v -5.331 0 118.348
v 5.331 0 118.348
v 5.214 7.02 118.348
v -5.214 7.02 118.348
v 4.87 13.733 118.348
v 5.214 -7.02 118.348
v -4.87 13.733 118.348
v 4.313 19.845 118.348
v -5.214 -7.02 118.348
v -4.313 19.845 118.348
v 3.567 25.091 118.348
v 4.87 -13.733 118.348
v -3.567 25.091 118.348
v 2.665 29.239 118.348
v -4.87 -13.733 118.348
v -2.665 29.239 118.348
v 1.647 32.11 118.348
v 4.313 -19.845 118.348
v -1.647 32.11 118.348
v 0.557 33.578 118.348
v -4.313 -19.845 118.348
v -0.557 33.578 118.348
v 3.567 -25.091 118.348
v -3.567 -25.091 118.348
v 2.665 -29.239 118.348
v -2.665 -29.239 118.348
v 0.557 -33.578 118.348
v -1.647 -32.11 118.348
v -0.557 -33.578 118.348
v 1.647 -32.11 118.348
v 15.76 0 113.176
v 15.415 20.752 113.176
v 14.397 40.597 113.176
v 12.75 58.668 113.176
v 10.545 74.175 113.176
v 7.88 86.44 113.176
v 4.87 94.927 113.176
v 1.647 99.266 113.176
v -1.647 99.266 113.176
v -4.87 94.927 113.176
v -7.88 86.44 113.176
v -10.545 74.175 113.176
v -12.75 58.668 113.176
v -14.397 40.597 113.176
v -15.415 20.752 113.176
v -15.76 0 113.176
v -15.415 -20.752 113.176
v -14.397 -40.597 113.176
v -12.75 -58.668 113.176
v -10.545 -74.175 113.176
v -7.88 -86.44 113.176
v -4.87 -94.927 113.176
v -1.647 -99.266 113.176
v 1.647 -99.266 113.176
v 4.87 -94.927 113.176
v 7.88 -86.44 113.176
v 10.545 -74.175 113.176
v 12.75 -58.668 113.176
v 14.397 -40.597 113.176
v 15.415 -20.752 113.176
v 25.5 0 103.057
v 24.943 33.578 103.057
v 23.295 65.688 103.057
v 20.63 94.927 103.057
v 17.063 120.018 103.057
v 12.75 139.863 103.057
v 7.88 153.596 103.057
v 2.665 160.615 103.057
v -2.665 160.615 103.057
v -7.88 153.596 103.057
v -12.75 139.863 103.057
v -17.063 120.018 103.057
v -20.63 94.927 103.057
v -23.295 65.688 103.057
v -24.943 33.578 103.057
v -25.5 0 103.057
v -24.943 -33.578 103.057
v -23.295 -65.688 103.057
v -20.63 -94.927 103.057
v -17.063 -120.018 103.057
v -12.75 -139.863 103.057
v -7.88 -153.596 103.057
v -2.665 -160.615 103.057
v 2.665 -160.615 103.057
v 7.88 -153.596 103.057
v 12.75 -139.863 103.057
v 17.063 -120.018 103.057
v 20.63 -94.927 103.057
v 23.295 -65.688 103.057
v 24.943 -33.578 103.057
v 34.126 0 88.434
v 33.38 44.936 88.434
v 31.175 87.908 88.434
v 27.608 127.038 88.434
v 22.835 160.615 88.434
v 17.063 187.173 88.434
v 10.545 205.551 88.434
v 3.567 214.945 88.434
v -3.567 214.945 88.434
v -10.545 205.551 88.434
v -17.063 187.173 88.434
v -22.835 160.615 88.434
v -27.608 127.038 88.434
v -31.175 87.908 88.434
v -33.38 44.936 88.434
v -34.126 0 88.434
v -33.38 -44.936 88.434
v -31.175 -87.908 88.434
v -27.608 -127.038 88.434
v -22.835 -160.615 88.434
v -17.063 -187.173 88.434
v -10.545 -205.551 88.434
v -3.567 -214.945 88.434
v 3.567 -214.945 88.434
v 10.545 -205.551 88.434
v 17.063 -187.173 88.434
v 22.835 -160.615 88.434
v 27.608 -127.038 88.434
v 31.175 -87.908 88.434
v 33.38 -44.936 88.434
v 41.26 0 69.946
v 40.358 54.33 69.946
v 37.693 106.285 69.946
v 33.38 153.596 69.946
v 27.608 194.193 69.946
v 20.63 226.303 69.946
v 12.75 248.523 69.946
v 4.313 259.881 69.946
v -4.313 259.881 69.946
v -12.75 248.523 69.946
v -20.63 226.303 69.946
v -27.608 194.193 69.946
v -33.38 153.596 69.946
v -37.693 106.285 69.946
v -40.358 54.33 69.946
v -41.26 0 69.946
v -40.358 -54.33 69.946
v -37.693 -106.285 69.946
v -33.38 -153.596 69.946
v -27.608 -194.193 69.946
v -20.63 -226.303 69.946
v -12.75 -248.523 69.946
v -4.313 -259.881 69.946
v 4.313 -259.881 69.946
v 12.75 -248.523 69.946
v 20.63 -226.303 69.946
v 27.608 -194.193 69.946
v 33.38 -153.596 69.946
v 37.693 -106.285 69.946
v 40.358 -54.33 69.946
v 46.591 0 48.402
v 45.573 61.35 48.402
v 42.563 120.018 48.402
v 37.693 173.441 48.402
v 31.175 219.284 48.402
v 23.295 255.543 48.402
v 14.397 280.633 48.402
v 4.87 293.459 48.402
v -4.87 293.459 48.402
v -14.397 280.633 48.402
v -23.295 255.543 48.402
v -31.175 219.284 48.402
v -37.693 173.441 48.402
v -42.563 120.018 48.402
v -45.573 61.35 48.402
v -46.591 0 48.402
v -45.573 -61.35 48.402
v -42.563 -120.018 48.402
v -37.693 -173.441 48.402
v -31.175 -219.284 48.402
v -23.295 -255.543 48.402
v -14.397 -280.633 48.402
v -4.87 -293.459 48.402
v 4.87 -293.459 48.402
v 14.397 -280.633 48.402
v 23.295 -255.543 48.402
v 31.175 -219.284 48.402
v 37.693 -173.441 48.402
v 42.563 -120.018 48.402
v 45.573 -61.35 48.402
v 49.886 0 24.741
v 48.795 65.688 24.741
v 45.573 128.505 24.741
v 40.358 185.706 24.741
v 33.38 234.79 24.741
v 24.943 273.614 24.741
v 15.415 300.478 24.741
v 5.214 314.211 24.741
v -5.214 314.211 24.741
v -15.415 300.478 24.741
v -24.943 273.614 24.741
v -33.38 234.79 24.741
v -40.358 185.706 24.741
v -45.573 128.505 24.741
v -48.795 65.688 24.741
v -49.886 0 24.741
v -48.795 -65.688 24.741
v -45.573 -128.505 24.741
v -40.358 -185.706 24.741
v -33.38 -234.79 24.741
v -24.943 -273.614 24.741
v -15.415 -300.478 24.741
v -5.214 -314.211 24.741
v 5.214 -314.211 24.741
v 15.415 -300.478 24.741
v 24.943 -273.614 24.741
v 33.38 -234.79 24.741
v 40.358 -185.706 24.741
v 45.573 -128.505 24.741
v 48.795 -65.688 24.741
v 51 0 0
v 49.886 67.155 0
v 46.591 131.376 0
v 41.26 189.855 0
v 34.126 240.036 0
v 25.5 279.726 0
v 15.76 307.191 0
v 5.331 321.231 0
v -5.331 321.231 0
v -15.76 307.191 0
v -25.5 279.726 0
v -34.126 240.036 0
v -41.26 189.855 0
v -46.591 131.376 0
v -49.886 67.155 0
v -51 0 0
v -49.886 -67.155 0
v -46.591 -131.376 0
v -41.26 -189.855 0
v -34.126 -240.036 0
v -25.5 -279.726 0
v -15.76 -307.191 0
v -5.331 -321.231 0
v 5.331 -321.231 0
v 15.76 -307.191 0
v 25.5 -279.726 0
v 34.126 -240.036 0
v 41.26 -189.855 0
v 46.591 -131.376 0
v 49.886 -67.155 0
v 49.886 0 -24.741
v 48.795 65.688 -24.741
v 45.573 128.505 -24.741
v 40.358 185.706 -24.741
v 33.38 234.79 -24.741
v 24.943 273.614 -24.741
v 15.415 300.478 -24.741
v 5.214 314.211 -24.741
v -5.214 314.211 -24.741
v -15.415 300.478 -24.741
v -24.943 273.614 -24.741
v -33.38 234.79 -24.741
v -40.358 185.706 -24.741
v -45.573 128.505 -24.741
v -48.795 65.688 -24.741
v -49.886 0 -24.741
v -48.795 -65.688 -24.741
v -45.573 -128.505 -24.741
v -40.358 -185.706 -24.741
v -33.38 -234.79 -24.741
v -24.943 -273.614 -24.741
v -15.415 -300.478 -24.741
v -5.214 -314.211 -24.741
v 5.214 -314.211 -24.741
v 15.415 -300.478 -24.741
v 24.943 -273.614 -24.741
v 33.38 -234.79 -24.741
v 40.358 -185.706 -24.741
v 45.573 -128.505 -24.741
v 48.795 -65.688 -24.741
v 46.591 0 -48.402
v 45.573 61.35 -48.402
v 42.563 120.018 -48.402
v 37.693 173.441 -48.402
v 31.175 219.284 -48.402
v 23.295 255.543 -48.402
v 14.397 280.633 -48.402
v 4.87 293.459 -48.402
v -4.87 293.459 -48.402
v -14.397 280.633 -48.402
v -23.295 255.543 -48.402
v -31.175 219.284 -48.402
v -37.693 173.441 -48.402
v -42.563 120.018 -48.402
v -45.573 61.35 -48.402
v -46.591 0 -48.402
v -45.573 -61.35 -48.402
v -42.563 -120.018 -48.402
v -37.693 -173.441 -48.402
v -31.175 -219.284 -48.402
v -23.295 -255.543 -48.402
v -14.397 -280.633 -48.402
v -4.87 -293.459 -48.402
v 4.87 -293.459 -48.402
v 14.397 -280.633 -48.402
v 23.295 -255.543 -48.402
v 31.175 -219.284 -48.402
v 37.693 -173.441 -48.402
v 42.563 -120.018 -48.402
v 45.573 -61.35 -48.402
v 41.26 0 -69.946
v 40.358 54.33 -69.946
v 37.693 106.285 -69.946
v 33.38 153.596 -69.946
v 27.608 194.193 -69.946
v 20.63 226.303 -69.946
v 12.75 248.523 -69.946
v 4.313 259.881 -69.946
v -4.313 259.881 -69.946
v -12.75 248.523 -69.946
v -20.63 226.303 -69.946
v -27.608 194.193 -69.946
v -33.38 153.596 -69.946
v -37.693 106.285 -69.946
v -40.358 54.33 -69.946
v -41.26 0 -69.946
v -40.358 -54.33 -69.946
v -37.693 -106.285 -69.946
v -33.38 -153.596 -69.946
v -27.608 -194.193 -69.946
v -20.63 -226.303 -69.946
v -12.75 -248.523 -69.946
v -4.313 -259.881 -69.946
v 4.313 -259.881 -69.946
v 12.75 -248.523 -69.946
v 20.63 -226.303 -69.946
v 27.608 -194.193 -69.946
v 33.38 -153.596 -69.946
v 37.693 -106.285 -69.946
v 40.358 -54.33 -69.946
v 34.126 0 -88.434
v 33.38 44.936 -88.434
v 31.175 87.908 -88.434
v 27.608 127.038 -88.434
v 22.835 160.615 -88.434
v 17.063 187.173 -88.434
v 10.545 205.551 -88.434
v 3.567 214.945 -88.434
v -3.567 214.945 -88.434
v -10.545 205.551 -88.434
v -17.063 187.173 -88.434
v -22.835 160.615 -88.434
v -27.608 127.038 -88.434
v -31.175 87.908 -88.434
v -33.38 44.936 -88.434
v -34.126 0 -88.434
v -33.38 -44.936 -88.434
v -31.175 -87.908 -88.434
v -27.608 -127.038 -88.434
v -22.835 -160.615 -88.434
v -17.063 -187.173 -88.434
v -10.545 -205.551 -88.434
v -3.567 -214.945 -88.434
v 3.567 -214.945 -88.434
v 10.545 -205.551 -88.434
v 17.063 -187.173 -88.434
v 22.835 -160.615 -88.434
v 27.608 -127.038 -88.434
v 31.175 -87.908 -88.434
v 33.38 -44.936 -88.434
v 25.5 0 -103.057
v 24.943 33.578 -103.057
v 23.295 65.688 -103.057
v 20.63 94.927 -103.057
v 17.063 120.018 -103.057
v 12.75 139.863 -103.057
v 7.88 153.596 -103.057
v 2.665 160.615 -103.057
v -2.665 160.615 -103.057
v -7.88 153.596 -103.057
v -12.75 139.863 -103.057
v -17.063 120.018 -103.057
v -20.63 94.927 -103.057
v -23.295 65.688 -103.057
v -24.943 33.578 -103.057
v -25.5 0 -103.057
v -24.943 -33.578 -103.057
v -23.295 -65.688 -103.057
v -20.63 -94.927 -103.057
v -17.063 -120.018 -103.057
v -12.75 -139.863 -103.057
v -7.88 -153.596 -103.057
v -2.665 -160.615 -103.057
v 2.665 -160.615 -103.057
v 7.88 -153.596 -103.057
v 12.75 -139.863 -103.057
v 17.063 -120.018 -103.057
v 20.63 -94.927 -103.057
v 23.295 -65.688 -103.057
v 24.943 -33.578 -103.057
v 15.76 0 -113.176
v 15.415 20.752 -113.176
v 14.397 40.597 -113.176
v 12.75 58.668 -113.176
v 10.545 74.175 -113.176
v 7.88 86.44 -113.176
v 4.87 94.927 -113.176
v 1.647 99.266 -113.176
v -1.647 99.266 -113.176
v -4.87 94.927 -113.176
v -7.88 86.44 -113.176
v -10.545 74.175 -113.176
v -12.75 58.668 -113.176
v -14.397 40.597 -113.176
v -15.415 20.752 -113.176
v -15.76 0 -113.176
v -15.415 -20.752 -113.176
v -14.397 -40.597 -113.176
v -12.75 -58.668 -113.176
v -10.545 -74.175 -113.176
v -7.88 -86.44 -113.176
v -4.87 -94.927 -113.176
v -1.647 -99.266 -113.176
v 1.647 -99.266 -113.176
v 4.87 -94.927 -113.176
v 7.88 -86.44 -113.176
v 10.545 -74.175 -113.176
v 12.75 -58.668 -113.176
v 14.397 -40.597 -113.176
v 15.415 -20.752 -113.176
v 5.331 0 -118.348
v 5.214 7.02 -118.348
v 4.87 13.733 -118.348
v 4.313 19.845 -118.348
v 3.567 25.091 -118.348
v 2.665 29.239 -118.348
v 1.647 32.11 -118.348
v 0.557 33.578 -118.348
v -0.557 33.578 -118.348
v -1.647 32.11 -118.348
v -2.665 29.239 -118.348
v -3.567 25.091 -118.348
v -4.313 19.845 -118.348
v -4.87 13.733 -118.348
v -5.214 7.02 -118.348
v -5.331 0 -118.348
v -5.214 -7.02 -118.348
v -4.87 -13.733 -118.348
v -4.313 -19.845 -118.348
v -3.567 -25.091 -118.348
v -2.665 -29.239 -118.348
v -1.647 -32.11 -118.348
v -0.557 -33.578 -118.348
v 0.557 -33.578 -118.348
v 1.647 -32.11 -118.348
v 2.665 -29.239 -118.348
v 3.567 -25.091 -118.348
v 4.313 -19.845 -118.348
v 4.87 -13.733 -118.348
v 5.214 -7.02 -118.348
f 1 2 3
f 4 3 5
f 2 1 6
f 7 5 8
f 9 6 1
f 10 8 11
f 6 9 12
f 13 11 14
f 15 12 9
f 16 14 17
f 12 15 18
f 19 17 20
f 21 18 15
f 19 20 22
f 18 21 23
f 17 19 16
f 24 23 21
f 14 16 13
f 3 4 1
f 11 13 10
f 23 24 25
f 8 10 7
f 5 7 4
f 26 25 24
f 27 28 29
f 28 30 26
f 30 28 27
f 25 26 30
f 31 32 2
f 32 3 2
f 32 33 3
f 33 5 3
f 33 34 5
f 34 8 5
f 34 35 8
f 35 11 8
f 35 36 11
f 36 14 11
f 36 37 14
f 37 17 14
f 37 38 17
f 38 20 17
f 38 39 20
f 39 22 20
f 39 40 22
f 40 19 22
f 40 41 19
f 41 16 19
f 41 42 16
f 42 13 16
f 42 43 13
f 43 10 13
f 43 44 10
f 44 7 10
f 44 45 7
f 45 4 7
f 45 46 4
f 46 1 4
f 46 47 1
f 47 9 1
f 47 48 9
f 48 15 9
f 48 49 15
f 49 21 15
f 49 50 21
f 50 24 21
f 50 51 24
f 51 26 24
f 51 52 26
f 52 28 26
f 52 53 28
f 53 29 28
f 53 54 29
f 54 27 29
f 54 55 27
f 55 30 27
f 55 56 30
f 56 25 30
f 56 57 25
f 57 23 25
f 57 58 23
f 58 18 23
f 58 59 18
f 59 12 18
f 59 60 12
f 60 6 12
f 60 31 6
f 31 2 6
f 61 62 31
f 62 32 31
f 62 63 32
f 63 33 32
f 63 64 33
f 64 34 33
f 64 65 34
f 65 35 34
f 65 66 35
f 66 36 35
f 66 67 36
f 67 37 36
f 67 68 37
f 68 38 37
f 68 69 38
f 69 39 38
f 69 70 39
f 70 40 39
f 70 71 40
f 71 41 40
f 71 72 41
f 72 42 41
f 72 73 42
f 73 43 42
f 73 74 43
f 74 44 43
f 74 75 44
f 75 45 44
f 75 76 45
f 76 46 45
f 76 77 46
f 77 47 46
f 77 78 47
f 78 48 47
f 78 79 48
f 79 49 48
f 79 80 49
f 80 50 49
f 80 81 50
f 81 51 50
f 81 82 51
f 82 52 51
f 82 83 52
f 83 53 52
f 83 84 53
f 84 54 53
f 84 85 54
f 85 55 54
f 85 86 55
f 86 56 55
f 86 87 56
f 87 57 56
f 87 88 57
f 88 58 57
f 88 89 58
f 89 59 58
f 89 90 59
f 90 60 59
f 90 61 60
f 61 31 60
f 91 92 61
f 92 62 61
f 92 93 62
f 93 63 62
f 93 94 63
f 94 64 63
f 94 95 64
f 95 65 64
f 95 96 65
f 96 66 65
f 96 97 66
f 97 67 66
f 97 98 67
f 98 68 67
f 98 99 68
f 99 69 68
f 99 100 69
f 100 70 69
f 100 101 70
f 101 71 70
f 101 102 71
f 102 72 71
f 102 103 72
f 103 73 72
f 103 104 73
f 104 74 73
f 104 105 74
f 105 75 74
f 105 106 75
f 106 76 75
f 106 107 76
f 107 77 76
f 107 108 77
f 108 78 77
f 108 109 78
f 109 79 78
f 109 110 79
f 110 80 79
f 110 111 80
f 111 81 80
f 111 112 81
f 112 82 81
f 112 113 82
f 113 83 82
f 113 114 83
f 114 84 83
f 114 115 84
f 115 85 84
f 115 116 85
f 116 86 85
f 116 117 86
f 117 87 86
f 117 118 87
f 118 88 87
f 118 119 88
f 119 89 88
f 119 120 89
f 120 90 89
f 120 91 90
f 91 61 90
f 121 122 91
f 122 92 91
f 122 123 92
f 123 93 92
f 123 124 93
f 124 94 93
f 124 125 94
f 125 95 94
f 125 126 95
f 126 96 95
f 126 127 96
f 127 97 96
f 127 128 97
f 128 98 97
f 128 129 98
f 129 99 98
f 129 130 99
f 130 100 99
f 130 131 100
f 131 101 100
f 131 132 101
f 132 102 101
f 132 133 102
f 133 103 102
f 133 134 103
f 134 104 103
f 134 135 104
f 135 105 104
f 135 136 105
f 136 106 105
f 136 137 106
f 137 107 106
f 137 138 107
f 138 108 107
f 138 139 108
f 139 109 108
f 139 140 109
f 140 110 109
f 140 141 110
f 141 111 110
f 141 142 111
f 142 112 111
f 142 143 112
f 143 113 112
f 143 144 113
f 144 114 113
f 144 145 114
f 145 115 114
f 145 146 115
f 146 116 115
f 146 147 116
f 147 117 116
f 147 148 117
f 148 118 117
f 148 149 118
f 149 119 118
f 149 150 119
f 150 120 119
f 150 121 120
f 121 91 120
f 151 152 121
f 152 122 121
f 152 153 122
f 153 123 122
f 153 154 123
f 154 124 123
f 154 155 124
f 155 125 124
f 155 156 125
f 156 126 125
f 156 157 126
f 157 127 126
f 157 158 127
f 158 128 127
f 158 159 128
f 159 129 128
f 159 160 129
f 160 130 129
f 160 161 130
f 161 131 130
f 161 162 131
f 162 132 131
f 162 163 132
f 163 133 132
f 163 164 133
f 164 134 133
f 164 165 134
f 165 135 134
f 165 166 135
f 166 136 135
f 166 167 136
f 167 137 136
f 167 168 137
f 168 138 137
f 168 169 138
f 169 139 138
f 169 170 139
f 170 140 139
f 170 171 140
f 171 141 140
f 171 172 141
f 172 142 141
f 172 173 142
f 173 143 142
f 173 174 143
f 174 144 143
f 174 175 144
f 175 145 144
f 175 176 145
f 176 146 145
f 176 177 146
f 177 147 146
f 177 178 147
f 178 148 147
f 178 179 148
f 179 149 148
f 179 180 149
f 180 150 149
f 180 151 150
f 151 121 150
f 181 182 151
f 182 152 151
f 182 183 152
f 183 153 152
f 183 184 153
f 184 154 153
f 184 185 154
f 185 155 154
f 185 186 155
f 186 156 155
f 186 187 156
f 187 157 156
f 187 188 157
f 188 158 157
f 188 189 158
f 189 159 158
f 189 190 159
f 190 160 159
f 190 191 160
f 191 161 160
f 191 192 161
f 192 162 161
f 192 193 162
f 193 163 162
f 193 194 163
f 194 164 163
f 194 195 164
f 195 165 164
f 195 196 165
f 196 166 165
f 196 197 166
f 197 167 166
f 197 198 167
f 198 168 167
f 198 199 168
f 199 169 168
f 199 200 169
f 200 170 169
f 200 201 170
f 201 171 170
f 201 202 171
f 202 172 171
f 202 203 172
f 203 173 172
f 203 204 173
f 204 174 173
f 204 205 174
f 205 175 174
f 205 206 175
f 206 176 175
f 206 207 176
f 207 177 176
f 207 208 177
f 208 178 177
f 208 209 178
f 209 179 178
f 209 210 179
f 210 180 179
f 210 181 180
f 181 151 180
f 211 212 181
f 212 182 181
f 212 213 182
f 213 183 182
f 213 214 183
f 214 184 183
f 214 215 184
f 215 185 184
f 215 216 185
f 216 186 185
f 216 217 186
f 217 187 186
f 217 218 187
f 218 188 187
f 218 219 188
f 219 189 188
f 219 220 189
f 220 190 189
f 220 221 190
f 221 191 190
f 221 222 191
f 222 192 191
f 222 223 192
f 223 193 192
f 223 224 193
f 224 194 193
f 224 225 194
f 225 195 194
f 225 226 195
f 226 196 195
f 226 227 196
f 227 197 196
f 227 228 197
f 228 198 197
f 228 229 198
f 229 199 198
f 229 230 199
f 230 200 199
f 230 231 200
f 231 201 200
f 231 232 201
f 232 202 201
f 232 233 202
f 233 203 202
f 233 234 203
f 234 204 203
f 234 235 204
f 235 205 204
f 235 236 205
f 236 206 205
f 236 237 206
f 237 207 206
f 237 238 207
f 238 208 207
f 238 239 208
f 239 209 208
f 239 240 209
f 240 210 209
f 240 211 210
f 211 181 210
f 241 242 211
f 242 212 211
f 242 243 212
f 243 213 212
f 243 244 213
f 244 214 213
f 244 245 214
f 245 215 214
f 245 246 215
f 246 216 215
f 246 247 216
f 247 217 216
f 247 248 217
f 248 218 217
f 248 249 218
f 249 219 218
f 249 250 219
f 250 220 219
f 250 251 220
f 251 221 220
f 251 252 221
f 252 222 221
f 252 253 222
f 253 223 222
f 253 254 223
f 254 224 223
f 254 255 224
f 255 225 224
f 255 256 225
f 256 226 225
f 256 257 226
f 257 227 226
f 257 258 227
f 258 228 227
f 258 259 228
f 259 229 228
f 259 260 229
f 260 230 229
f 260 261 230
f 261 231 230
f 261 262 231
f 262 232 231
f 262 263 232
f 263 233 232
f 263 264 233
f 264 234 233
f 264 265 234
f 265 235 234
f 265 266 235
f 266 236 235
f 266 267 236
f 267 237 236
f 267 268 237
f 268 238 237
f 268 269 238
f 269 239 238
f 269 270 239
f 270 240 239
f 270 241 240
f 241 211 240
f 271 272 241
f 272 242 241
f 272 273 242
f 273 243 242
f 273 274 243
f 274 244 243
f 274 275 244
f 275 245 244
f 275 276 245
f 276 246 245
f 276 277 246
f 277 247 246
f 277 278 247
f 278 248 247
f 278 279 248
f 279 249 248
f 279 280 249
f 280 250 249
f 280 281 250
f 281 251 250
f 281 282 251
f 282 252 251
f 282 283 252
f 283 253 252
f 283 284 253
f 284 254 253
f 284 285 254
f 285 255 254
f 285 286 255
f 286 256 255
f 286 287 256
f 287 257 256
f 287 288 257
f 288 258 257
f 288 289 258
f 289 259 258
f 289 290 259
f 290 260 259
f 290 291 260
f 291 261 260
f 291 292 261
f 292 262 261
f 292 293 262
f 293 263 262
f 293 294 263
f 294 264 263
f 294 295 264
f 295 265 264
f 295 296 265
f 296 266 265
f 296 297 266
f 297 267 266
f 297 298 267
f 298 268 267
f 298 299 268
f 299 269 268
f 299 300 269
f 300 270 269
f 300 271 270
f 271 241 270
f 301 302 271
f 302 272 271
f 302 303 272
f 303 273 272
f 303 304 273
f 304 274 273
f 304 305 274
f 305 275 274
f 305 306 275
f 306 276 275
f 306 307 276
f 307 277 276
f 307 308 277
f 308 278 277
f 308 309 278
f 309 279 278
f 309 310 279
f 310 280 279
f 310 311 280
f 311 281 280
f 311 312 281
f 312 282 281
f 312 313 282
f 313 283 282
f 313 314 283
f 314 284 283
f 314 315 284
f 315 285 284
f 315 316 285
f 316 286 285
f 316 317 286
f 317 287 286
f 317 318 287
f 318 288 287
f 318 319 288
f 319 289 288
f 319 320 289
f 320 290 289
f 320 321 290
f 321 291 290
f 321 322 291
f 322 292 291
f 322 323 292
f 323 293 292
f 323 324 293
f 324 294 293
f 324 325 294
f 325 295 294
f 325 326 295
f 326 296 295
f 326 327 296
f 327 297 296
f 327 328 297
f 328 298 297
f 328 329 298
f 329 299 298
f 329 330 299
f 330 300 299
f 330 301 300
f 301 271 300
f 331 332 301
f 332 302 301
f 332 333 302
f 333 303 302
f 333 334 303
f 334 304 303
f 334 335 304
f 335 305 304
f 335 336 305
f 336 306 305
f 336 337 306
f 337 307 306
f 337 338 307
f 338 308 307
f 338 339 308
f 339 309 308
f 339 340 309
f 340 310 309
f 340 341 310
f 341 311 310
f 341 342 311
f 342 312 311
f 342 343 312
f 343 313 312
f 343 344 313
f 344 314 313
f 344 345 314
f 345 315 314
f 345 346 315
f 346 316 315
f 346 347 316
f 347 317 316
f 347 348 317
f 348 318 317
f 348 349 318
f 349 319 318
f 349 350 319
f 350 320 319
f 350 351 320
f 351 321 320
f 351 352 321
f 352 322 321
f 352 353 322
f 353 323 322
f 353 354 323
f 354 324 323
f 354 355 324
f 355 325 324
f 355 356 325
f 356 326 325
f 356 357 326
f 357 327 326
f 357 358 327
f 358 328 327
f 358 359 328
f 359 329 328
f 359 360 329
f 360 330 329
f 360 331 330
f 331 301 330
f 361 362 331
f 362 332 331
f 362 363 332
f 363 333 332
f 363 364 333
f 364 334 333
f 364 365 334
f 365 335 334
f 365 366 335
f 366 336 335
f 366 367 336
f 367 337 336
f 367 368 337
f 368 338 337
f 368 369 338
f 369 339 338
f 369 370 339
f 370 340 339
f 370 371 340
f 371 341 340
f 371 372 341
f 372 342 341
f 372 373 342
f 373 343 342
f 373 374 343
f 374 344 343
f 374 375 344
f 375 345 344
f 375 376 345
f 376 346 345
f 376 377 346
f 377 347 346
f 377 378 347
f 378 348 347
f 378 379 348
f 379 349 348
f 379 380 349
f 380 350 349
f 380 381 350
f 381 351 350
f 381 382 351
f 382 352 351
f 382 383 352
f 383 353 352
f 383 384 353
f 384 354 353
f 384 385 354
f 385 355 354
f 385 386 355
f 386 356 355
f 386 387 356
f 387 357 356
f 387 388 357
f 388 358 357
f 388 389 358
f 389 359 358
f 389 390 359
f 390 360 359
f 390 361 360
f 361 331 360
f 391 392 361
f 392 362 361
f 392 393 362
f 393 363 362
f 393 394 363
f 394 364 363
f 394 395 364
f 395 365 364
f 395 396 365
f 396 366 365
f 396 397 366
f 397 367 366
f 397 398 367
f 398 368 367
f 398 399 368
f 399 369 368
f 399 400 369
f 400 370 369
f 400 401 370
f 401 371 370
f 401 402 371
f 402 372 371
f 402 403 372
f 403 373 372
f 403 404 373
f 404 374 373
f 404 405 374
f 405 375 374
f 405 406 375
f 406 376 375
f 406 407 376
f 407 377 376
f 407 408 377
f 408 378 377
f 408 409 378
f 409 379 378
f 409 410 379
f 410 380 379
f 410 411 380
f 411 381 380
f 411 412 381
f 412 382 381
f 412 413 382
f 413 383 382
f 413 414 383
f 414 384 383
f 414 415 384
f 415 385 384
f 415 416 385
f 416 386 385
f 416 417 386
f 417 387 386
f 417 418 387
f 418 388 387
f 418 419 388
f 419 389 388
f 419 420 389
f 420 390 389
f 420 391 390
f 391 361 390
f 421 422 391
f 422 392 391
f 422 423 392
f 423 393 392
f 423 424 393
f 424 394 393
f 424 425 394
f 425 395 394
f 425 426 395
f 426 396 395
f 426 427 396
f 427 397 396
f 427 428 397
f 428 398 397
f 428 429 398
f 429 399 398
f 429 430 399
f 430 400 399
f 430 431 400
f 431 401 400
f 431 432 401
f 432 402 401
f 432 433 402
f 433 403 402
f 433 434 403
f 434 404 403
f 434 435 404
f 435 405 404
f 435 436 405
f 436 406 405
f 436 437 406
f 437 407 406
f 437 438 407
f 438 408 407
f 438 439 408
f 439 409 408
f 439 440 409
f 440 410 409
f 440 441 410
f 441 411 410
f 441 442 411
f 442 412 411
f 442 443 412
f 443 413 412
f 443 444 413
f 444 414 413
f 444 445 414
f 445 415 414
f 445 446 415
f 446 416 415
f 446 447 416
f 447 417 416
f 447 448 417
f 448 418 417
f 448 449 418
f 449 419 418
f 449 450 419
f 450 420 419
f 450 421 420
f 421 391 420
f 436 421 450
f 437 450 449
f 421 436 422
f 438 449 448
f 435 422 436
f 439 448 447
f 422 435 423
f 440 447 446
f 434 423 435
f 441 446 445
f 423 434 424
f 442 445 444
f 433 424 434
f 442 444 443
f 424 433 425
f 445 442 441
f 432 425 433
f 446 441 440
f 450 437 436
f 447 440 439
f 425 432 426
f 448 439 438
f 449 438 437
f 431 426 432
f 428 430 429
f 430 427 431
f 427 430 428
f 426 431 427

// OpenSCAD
// Generated by SolidPython 1.0.1 on 2020-07-29 00:46:46


scale(v = [3, 19, 7]) {
	sphere(r = 17);
}
/***********************************************
*********      SolidPython code:      **********
************************************************
 
# import packages: SolidPython
from solid import *
from solid.utils import *
from itertools import chain, combinations, permutations


class Resize:

    def __init__(self, scad_file):
        self.scad_file = scad_file
        #self.scad_file = import_scad(scad_file)
        # cone/cylinder param:
        self.r1 = 0
        self.r2 = 0
        self.h = 0
        # rectangular prism param:
        self.w = 0
        self.l = 0
        # ellipse param:
        self.r = 0

    # import OpenScad code (file name corresponds to shape)


    # classify shape + parameters
    def assign(self, param1, param2, param3):
        if self.scad_file == 'cone.scad':
            self.r1 = param1
            self.r2 = param2
            self.h = param3
        elif self.scad_file == 'cylinder.scad':
            self.r1 = param1
            self.r2 = param2
            self.h = param3
        elif self.scad_file == 'rectangularPrism.scad':
            self.h = param1
            self.l = param2
            self.w = param3
        else:
            self.r = param1
            self.h = param2

    # resize parameters
    def iterate(self):
        x = range(3, 20, 2)
        i = 1
        if self.scad_file == 'cone.scad':
            tempList = list(permutations(x, 2))
            for temp in tempList:
                param1 = temp[0]
                param2 = temp[1]
                filepath = 'produced_scad_files/' + 'cone' + str(param1) + '_' + str(param2) + '_' + '.scad'
                scad_render_to_file(cylinder(h=param1, r1=param2, r2=0), filepath)

        elif self.scad_file == 'cylinder.scad':
            tempList = list(permutations(x, 3))
            for temp in tempList:
                param1 = temp[0]
                param2 = temp[1]
                filepath = 'produced_scad_files/' + 'cylinder' + str(param1) + '_' + str(param2) + '_' + '.scad'
                scad_render_to_file(cylinder(h=param1, r1=param2, r2=param2), filepath)

        elif self.scad_file == 'rectangularPrism.scad':
            tempList = list(permutations(x, 3))
            for temp in tempList:
                param1 = temp[0]
                param2 = temp[1]
                param3 = temp[2]
                filepath = 'produced_scad_files/' + 'rectangularPrism' + str(param1) + '_' + str(param2) + '_' + str(
                    param3) + '.scad'
                scad_render_to_file(cube(size=(param1, param2, param3)), filepath)

        elif self.scad_file == 'ellipse.scad':
            tempList = list(permutations(x, 4))
            for temp in tempList:
                param1 = temp[0]
                param2 = temp[1]
                param3 = temp[2]
                param4 = temp[3]
                filepath = 'produced_scad_files/' + 'ellipse' + str(param1) + '_' + str(param2) + '_' + str(param3) + '_' + str(param4) + '.scad'
                scad_render_to_file(scale([param1, param2, param3])(sphere(r=param4)), filepath)

    def render_to_scadfile(self):
        scad_render_to_file(scad, 'example.scad') 
 
************************************************/
